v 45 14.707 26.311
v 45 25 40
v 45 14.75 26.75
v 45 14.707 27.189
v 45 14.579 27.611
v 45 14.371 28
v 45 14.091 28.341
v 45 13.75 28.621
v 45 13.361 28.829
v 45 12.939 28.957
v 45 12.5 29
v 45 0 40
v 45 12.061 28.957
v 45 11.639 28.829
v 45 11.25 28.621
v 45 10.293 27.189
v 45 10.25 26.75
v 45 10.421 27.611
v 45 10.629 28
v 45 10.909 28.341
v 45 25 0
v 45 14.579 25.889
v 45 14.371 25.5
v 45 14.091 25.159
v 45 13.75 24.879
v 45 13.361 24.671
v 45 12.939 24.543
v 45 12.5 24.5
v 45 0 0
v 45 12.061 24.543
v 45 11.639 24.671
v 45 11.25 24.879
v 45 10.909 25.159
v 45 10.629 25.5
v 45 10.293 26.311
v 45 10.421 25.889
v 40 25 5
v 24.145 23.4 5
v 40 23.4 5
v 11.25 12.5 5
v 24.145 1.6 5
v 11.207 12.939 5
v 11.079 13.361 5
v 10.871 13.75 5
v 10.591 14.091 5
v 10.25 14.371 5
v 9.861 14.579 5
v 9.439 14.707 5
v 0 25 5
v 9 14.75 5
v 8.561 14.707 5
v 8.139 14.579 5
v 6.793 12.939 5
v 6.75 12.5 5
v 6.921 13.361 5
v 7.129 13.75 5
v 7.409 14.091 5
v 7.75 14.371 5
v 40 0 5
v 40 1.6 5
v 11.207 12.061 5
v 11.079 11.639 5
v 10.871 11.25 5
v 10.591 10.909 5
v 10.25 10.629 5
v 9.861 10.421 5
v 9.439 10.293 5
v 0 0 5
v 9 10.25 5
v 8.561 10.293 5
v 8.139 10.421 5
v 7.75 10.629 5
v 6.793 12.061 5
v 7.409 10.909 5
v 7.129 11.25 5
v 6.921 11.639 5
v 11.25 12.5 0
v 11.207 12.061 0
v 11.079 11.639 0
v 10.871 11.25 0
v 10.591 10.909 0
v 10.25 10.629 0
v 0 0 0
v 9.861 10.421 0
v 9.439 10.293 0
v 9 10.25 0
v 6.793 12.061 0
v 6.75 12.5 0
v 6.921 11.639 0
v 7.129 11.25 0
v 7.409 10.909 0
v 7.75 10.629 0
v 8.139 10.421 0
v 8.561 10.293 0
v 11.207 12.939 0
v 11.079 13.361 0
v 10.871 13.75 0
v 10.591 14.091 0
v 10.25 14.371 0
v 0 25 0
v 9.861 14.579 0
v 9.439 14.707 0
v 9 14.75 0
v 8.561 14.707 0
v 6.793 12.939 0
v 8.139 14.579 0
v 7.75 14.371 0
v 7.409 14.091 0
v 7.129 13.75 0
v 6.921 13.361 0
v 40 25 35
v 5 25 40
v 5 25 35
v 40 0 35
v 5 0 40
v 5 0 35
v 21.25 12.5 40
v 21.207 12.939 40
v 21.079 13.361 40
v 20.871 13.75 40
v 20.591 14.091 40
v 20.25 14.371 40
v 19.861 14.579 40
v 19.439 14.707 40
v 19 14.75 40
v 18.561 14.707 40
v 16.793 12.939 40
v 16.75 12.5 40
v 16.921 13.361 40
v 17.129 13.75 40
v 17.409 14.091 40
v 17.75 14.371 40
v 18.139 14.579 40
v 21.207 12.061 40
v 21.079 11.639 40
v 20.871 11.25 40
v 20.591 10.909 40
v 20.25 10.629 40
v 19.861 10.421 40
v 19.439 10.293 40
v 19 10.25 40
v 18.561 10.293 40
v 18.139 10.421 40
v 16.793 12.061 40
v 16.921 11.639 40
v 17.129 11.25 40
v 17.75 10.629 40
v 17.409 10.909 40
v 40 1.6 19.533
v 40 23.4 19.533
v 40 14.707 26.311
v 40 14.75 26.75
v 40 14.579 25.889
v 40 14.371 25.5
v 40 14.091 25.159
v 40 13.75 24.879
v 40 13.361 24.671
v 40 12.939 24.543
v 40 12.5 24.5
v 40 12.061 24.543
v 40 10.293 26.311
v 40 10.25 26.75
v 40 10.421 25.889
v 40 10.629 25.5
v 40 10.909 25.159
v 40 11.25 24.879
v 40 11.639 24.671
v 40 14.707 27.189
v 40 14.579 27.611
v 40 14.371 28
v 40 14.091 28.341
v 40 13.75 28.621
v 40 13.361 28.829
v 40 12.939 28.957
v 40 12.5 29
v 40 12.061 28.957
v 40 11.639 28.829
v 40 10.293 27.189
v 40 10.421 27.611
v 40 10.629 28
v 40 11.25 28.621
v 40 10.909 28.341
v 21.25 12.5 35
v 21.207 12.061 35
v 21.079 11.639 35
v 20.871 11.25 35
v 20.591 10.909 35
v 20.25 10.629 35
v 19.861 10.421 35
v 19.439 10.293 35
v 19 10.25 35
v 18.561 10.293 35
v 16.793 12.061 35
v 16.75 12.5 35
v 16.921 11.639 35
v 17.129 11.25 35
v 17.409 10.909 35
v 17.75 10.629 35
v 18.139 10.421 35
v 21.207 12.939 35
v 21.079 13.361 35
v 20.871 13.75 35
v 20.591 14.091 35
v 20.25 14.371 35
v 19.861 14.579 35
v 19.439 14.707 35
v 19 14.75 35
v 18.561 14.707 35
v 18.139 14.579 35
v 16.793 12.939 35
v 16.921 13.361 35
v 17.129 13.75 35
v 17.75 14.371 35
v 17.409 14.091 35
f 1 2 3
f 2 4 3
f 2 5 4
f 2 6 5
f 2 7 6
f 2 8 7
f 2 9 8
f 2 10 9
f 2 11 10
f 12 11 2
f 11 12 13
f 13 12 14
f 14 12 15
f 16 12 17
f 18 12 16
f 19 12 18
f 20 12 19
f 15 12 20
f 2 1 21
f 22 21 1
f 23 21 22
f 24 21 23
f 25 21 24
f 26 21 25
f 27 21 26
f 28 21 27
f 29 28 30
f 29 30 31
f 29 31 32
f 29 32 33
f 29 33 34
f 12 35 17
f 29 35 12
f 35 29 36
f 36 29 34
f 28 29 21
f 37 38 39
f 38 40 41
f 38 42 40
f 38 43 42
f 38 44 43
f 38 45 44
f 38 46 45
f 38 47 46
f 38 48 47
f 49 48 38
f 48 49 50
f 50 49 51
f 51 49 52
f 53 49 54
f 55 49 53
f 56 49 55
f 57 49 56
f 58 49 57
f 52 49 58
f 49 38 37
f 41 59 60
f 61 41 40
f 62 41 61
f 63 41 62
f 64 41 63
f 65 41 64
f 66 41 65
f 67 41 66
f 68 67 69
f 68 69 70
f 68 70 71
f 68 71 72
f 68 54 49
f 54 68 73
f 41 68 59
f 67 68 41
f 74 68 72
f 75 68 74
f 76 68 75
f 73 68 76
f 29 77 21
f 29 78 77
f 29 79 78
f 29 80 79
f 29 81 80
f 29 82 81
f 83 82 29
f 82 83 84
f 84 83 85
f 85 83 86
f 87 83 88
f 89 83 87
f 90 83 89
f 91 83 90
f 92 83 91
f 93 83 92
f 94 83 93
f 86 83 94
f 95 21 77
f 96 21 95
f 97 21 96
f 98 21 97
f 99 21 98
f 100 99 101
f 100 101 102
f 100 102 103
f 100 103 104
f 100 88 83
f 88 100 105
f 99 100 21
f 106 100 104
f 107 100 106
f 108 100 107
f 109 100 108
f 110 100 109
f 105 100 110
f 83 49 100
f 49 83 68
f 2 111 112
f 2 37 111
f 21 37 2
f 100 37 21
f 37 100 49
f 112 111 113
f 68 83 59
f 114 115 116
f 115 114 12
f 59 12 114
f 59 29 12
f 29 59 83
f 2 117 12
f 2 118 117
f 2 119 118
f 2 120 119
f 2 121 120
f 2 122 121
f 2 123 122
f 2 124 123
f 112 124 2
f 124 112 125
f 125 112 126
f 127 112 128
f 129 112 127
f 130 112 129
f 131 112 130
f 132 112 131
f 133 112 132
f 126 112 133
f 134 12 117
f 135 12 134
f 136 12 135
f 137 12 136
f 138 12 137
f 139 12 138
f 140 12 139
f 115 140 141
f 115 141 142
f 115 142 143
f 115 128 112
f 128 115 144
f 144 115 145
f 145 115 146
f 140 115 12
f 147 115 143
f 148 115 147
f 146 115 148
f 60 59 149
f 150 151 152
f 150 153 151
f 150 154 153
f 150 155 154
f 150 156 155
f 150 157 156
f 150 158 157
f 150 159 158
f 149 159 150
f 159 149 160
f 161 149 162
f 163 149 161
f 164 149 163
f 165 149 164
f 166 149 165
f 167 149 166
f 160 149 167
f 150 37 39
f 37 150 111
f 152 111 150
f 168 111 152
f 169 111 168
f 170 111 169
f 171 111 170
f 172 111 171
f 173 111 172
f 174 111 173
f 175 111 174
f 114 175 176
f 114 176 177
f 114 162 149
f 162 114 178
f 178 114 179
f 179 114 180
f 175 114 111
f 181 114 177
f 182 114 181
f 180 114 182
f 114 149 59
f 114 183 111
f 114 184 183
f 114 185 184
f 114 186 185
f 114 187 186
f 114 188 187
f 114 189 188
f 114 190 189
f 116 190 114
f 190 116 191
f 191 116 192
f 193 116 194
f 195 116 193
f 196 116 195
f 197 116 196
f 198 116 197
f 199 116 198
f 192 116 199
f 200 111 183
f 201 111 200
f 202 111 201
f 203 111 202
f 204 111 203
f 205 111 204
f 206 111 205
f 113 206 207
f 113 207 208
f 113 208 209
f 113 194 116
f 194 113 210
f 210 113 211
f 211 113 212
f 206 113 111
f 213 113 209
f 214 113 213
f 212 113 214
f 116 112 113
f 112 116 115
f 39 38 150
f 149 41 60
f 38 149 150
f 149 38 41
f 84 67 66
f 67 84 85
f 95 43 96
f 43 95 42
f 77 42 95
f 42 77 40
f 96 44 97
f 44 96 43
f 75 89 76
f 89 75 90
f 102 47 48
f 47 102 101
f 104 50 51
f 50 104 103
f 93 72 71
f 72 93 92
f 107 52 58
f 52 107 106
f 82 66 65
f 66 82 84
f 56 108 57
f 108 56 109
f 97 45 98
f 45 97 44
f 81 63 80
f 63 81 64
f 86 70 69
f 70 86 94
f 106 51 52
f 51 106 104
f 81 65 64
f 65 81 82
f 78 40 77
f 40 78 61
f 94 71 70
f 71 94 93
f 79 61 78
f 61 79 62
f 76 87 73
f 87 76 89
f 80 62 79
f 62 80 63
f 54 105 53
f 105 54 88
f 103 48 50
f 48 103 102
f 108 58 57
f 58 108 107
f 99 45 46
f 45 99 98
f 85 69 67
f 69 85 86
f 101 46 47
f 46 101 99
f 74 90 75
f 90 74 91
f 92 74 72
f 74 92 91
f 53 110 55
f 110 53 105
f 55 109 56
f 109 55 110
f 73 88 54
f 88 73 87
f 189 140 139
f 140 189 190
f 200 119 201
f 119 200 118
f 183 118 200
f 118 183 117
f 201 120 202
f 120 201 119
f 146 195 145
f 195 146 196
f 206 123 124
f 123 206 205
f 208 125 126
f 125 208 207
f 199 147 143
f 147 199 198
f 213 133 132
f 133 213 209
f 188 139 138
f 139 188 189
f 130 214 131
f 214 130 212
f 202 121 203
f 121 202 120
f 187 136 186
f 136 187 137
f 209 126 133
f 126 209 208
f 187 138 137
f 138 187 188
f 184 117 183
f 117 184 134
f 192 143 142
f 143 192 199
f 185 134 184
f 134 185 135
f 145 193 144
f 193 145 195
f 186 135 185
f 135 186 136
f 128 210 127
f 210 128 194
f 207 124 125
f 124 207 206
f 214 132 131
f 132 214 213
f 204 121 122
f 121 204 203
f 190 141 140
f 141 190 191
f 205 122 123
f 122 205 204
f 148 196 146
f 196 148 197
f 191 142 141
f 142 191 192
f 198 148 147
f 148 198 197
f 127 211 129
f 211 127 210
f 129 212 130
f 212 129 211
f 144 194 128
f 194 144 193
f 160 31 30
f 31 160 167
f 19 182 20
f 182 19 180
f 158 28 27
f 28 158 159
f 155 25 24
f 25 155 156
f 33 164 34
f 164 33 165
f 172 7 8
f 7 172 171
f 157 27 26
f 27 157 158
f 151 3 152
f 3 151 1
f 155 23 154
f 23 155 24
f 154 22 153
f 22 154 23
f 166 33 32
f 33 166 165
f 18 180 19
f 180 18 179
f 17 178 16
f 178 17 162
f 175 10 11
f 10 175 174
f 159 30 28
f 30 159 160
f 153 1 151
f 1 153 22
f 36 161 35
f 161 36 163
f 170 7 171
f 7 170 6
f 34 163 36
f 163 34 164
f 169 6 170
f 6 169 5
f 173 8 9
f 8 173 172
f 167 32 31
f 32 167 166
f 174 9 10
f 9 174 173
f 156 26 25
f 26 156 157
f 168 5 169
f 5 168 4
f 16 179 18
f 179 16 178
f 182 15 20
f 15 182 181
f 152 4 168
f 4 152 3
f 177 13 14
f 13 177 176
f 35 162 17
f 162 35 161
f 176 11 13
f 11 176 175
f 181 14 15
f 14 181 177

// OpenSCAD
$fn = 32;

// ----------------------------------------------------------------------
// Z-bracket: 45 x 25 x 40 mm
// ----------------------------------------------------------------------

// --- parameters (mm) ---
foot_len = 45;            // lower foot length, X
top_len = 35;             // upper foot length, X
depth = 25;               // bracket width, Y
step_h = 40;              // overall rise, Z
plate_t = 5;              // plate thickness
hole_d = 4.5;             // clearance for M4
rib_len = 17.6;           // gusset leg
rib_sink = 1.6;           // gusset overlap into the plates

module hole_z(px, py, z0) {
  translate([px, py, z0 - 2.5]) cylinder(h = plate_t + 5, d = hole_d);
}
module hole_x(py, pz) {
  translate([-2.5, py, pz]) rotate([0, 90, 0]) cylinder(h = plate_t + 5, d = hole_d);
}
module gusset(x0) {
  translate([x0, depth - rib_sink, 0])
    rotate([90, 0, 0])
      linear_extrude(height = depth - 2 * rib_sink)
        polygon(points = [[rib_sink, plate_t - rib_sink],
                          [rib_sink, plate_t - rib_sink + rib_len],
                          [-rib_len, plate_t - rib_sink]]);
}

difference() {
  union() {
    cube([foot_len, depth, plate_t]);
    /* web, overlapping the lower foot */
    translate([foot_len - plate_t, 0, 0]) cube([plate_t, depth, step_h]);
    /* upper foot, sunk into the web */
    translate([foot_len - plate_t - top_len, 0, step_h - plate_t]) cube([top_len + plate_t, depth, plate_t]);
    gusset(foot_len - plate_t);
  }
  hole_z(9, 12.5, 0);
  translate([foot_len - plate_t - 21, 0, 0]) hole_z(0, 12.5, step_h - plate_t);
  translate([foot_len - plate_t, 0, 0]) hole_x(12.5, 26.75);
}
